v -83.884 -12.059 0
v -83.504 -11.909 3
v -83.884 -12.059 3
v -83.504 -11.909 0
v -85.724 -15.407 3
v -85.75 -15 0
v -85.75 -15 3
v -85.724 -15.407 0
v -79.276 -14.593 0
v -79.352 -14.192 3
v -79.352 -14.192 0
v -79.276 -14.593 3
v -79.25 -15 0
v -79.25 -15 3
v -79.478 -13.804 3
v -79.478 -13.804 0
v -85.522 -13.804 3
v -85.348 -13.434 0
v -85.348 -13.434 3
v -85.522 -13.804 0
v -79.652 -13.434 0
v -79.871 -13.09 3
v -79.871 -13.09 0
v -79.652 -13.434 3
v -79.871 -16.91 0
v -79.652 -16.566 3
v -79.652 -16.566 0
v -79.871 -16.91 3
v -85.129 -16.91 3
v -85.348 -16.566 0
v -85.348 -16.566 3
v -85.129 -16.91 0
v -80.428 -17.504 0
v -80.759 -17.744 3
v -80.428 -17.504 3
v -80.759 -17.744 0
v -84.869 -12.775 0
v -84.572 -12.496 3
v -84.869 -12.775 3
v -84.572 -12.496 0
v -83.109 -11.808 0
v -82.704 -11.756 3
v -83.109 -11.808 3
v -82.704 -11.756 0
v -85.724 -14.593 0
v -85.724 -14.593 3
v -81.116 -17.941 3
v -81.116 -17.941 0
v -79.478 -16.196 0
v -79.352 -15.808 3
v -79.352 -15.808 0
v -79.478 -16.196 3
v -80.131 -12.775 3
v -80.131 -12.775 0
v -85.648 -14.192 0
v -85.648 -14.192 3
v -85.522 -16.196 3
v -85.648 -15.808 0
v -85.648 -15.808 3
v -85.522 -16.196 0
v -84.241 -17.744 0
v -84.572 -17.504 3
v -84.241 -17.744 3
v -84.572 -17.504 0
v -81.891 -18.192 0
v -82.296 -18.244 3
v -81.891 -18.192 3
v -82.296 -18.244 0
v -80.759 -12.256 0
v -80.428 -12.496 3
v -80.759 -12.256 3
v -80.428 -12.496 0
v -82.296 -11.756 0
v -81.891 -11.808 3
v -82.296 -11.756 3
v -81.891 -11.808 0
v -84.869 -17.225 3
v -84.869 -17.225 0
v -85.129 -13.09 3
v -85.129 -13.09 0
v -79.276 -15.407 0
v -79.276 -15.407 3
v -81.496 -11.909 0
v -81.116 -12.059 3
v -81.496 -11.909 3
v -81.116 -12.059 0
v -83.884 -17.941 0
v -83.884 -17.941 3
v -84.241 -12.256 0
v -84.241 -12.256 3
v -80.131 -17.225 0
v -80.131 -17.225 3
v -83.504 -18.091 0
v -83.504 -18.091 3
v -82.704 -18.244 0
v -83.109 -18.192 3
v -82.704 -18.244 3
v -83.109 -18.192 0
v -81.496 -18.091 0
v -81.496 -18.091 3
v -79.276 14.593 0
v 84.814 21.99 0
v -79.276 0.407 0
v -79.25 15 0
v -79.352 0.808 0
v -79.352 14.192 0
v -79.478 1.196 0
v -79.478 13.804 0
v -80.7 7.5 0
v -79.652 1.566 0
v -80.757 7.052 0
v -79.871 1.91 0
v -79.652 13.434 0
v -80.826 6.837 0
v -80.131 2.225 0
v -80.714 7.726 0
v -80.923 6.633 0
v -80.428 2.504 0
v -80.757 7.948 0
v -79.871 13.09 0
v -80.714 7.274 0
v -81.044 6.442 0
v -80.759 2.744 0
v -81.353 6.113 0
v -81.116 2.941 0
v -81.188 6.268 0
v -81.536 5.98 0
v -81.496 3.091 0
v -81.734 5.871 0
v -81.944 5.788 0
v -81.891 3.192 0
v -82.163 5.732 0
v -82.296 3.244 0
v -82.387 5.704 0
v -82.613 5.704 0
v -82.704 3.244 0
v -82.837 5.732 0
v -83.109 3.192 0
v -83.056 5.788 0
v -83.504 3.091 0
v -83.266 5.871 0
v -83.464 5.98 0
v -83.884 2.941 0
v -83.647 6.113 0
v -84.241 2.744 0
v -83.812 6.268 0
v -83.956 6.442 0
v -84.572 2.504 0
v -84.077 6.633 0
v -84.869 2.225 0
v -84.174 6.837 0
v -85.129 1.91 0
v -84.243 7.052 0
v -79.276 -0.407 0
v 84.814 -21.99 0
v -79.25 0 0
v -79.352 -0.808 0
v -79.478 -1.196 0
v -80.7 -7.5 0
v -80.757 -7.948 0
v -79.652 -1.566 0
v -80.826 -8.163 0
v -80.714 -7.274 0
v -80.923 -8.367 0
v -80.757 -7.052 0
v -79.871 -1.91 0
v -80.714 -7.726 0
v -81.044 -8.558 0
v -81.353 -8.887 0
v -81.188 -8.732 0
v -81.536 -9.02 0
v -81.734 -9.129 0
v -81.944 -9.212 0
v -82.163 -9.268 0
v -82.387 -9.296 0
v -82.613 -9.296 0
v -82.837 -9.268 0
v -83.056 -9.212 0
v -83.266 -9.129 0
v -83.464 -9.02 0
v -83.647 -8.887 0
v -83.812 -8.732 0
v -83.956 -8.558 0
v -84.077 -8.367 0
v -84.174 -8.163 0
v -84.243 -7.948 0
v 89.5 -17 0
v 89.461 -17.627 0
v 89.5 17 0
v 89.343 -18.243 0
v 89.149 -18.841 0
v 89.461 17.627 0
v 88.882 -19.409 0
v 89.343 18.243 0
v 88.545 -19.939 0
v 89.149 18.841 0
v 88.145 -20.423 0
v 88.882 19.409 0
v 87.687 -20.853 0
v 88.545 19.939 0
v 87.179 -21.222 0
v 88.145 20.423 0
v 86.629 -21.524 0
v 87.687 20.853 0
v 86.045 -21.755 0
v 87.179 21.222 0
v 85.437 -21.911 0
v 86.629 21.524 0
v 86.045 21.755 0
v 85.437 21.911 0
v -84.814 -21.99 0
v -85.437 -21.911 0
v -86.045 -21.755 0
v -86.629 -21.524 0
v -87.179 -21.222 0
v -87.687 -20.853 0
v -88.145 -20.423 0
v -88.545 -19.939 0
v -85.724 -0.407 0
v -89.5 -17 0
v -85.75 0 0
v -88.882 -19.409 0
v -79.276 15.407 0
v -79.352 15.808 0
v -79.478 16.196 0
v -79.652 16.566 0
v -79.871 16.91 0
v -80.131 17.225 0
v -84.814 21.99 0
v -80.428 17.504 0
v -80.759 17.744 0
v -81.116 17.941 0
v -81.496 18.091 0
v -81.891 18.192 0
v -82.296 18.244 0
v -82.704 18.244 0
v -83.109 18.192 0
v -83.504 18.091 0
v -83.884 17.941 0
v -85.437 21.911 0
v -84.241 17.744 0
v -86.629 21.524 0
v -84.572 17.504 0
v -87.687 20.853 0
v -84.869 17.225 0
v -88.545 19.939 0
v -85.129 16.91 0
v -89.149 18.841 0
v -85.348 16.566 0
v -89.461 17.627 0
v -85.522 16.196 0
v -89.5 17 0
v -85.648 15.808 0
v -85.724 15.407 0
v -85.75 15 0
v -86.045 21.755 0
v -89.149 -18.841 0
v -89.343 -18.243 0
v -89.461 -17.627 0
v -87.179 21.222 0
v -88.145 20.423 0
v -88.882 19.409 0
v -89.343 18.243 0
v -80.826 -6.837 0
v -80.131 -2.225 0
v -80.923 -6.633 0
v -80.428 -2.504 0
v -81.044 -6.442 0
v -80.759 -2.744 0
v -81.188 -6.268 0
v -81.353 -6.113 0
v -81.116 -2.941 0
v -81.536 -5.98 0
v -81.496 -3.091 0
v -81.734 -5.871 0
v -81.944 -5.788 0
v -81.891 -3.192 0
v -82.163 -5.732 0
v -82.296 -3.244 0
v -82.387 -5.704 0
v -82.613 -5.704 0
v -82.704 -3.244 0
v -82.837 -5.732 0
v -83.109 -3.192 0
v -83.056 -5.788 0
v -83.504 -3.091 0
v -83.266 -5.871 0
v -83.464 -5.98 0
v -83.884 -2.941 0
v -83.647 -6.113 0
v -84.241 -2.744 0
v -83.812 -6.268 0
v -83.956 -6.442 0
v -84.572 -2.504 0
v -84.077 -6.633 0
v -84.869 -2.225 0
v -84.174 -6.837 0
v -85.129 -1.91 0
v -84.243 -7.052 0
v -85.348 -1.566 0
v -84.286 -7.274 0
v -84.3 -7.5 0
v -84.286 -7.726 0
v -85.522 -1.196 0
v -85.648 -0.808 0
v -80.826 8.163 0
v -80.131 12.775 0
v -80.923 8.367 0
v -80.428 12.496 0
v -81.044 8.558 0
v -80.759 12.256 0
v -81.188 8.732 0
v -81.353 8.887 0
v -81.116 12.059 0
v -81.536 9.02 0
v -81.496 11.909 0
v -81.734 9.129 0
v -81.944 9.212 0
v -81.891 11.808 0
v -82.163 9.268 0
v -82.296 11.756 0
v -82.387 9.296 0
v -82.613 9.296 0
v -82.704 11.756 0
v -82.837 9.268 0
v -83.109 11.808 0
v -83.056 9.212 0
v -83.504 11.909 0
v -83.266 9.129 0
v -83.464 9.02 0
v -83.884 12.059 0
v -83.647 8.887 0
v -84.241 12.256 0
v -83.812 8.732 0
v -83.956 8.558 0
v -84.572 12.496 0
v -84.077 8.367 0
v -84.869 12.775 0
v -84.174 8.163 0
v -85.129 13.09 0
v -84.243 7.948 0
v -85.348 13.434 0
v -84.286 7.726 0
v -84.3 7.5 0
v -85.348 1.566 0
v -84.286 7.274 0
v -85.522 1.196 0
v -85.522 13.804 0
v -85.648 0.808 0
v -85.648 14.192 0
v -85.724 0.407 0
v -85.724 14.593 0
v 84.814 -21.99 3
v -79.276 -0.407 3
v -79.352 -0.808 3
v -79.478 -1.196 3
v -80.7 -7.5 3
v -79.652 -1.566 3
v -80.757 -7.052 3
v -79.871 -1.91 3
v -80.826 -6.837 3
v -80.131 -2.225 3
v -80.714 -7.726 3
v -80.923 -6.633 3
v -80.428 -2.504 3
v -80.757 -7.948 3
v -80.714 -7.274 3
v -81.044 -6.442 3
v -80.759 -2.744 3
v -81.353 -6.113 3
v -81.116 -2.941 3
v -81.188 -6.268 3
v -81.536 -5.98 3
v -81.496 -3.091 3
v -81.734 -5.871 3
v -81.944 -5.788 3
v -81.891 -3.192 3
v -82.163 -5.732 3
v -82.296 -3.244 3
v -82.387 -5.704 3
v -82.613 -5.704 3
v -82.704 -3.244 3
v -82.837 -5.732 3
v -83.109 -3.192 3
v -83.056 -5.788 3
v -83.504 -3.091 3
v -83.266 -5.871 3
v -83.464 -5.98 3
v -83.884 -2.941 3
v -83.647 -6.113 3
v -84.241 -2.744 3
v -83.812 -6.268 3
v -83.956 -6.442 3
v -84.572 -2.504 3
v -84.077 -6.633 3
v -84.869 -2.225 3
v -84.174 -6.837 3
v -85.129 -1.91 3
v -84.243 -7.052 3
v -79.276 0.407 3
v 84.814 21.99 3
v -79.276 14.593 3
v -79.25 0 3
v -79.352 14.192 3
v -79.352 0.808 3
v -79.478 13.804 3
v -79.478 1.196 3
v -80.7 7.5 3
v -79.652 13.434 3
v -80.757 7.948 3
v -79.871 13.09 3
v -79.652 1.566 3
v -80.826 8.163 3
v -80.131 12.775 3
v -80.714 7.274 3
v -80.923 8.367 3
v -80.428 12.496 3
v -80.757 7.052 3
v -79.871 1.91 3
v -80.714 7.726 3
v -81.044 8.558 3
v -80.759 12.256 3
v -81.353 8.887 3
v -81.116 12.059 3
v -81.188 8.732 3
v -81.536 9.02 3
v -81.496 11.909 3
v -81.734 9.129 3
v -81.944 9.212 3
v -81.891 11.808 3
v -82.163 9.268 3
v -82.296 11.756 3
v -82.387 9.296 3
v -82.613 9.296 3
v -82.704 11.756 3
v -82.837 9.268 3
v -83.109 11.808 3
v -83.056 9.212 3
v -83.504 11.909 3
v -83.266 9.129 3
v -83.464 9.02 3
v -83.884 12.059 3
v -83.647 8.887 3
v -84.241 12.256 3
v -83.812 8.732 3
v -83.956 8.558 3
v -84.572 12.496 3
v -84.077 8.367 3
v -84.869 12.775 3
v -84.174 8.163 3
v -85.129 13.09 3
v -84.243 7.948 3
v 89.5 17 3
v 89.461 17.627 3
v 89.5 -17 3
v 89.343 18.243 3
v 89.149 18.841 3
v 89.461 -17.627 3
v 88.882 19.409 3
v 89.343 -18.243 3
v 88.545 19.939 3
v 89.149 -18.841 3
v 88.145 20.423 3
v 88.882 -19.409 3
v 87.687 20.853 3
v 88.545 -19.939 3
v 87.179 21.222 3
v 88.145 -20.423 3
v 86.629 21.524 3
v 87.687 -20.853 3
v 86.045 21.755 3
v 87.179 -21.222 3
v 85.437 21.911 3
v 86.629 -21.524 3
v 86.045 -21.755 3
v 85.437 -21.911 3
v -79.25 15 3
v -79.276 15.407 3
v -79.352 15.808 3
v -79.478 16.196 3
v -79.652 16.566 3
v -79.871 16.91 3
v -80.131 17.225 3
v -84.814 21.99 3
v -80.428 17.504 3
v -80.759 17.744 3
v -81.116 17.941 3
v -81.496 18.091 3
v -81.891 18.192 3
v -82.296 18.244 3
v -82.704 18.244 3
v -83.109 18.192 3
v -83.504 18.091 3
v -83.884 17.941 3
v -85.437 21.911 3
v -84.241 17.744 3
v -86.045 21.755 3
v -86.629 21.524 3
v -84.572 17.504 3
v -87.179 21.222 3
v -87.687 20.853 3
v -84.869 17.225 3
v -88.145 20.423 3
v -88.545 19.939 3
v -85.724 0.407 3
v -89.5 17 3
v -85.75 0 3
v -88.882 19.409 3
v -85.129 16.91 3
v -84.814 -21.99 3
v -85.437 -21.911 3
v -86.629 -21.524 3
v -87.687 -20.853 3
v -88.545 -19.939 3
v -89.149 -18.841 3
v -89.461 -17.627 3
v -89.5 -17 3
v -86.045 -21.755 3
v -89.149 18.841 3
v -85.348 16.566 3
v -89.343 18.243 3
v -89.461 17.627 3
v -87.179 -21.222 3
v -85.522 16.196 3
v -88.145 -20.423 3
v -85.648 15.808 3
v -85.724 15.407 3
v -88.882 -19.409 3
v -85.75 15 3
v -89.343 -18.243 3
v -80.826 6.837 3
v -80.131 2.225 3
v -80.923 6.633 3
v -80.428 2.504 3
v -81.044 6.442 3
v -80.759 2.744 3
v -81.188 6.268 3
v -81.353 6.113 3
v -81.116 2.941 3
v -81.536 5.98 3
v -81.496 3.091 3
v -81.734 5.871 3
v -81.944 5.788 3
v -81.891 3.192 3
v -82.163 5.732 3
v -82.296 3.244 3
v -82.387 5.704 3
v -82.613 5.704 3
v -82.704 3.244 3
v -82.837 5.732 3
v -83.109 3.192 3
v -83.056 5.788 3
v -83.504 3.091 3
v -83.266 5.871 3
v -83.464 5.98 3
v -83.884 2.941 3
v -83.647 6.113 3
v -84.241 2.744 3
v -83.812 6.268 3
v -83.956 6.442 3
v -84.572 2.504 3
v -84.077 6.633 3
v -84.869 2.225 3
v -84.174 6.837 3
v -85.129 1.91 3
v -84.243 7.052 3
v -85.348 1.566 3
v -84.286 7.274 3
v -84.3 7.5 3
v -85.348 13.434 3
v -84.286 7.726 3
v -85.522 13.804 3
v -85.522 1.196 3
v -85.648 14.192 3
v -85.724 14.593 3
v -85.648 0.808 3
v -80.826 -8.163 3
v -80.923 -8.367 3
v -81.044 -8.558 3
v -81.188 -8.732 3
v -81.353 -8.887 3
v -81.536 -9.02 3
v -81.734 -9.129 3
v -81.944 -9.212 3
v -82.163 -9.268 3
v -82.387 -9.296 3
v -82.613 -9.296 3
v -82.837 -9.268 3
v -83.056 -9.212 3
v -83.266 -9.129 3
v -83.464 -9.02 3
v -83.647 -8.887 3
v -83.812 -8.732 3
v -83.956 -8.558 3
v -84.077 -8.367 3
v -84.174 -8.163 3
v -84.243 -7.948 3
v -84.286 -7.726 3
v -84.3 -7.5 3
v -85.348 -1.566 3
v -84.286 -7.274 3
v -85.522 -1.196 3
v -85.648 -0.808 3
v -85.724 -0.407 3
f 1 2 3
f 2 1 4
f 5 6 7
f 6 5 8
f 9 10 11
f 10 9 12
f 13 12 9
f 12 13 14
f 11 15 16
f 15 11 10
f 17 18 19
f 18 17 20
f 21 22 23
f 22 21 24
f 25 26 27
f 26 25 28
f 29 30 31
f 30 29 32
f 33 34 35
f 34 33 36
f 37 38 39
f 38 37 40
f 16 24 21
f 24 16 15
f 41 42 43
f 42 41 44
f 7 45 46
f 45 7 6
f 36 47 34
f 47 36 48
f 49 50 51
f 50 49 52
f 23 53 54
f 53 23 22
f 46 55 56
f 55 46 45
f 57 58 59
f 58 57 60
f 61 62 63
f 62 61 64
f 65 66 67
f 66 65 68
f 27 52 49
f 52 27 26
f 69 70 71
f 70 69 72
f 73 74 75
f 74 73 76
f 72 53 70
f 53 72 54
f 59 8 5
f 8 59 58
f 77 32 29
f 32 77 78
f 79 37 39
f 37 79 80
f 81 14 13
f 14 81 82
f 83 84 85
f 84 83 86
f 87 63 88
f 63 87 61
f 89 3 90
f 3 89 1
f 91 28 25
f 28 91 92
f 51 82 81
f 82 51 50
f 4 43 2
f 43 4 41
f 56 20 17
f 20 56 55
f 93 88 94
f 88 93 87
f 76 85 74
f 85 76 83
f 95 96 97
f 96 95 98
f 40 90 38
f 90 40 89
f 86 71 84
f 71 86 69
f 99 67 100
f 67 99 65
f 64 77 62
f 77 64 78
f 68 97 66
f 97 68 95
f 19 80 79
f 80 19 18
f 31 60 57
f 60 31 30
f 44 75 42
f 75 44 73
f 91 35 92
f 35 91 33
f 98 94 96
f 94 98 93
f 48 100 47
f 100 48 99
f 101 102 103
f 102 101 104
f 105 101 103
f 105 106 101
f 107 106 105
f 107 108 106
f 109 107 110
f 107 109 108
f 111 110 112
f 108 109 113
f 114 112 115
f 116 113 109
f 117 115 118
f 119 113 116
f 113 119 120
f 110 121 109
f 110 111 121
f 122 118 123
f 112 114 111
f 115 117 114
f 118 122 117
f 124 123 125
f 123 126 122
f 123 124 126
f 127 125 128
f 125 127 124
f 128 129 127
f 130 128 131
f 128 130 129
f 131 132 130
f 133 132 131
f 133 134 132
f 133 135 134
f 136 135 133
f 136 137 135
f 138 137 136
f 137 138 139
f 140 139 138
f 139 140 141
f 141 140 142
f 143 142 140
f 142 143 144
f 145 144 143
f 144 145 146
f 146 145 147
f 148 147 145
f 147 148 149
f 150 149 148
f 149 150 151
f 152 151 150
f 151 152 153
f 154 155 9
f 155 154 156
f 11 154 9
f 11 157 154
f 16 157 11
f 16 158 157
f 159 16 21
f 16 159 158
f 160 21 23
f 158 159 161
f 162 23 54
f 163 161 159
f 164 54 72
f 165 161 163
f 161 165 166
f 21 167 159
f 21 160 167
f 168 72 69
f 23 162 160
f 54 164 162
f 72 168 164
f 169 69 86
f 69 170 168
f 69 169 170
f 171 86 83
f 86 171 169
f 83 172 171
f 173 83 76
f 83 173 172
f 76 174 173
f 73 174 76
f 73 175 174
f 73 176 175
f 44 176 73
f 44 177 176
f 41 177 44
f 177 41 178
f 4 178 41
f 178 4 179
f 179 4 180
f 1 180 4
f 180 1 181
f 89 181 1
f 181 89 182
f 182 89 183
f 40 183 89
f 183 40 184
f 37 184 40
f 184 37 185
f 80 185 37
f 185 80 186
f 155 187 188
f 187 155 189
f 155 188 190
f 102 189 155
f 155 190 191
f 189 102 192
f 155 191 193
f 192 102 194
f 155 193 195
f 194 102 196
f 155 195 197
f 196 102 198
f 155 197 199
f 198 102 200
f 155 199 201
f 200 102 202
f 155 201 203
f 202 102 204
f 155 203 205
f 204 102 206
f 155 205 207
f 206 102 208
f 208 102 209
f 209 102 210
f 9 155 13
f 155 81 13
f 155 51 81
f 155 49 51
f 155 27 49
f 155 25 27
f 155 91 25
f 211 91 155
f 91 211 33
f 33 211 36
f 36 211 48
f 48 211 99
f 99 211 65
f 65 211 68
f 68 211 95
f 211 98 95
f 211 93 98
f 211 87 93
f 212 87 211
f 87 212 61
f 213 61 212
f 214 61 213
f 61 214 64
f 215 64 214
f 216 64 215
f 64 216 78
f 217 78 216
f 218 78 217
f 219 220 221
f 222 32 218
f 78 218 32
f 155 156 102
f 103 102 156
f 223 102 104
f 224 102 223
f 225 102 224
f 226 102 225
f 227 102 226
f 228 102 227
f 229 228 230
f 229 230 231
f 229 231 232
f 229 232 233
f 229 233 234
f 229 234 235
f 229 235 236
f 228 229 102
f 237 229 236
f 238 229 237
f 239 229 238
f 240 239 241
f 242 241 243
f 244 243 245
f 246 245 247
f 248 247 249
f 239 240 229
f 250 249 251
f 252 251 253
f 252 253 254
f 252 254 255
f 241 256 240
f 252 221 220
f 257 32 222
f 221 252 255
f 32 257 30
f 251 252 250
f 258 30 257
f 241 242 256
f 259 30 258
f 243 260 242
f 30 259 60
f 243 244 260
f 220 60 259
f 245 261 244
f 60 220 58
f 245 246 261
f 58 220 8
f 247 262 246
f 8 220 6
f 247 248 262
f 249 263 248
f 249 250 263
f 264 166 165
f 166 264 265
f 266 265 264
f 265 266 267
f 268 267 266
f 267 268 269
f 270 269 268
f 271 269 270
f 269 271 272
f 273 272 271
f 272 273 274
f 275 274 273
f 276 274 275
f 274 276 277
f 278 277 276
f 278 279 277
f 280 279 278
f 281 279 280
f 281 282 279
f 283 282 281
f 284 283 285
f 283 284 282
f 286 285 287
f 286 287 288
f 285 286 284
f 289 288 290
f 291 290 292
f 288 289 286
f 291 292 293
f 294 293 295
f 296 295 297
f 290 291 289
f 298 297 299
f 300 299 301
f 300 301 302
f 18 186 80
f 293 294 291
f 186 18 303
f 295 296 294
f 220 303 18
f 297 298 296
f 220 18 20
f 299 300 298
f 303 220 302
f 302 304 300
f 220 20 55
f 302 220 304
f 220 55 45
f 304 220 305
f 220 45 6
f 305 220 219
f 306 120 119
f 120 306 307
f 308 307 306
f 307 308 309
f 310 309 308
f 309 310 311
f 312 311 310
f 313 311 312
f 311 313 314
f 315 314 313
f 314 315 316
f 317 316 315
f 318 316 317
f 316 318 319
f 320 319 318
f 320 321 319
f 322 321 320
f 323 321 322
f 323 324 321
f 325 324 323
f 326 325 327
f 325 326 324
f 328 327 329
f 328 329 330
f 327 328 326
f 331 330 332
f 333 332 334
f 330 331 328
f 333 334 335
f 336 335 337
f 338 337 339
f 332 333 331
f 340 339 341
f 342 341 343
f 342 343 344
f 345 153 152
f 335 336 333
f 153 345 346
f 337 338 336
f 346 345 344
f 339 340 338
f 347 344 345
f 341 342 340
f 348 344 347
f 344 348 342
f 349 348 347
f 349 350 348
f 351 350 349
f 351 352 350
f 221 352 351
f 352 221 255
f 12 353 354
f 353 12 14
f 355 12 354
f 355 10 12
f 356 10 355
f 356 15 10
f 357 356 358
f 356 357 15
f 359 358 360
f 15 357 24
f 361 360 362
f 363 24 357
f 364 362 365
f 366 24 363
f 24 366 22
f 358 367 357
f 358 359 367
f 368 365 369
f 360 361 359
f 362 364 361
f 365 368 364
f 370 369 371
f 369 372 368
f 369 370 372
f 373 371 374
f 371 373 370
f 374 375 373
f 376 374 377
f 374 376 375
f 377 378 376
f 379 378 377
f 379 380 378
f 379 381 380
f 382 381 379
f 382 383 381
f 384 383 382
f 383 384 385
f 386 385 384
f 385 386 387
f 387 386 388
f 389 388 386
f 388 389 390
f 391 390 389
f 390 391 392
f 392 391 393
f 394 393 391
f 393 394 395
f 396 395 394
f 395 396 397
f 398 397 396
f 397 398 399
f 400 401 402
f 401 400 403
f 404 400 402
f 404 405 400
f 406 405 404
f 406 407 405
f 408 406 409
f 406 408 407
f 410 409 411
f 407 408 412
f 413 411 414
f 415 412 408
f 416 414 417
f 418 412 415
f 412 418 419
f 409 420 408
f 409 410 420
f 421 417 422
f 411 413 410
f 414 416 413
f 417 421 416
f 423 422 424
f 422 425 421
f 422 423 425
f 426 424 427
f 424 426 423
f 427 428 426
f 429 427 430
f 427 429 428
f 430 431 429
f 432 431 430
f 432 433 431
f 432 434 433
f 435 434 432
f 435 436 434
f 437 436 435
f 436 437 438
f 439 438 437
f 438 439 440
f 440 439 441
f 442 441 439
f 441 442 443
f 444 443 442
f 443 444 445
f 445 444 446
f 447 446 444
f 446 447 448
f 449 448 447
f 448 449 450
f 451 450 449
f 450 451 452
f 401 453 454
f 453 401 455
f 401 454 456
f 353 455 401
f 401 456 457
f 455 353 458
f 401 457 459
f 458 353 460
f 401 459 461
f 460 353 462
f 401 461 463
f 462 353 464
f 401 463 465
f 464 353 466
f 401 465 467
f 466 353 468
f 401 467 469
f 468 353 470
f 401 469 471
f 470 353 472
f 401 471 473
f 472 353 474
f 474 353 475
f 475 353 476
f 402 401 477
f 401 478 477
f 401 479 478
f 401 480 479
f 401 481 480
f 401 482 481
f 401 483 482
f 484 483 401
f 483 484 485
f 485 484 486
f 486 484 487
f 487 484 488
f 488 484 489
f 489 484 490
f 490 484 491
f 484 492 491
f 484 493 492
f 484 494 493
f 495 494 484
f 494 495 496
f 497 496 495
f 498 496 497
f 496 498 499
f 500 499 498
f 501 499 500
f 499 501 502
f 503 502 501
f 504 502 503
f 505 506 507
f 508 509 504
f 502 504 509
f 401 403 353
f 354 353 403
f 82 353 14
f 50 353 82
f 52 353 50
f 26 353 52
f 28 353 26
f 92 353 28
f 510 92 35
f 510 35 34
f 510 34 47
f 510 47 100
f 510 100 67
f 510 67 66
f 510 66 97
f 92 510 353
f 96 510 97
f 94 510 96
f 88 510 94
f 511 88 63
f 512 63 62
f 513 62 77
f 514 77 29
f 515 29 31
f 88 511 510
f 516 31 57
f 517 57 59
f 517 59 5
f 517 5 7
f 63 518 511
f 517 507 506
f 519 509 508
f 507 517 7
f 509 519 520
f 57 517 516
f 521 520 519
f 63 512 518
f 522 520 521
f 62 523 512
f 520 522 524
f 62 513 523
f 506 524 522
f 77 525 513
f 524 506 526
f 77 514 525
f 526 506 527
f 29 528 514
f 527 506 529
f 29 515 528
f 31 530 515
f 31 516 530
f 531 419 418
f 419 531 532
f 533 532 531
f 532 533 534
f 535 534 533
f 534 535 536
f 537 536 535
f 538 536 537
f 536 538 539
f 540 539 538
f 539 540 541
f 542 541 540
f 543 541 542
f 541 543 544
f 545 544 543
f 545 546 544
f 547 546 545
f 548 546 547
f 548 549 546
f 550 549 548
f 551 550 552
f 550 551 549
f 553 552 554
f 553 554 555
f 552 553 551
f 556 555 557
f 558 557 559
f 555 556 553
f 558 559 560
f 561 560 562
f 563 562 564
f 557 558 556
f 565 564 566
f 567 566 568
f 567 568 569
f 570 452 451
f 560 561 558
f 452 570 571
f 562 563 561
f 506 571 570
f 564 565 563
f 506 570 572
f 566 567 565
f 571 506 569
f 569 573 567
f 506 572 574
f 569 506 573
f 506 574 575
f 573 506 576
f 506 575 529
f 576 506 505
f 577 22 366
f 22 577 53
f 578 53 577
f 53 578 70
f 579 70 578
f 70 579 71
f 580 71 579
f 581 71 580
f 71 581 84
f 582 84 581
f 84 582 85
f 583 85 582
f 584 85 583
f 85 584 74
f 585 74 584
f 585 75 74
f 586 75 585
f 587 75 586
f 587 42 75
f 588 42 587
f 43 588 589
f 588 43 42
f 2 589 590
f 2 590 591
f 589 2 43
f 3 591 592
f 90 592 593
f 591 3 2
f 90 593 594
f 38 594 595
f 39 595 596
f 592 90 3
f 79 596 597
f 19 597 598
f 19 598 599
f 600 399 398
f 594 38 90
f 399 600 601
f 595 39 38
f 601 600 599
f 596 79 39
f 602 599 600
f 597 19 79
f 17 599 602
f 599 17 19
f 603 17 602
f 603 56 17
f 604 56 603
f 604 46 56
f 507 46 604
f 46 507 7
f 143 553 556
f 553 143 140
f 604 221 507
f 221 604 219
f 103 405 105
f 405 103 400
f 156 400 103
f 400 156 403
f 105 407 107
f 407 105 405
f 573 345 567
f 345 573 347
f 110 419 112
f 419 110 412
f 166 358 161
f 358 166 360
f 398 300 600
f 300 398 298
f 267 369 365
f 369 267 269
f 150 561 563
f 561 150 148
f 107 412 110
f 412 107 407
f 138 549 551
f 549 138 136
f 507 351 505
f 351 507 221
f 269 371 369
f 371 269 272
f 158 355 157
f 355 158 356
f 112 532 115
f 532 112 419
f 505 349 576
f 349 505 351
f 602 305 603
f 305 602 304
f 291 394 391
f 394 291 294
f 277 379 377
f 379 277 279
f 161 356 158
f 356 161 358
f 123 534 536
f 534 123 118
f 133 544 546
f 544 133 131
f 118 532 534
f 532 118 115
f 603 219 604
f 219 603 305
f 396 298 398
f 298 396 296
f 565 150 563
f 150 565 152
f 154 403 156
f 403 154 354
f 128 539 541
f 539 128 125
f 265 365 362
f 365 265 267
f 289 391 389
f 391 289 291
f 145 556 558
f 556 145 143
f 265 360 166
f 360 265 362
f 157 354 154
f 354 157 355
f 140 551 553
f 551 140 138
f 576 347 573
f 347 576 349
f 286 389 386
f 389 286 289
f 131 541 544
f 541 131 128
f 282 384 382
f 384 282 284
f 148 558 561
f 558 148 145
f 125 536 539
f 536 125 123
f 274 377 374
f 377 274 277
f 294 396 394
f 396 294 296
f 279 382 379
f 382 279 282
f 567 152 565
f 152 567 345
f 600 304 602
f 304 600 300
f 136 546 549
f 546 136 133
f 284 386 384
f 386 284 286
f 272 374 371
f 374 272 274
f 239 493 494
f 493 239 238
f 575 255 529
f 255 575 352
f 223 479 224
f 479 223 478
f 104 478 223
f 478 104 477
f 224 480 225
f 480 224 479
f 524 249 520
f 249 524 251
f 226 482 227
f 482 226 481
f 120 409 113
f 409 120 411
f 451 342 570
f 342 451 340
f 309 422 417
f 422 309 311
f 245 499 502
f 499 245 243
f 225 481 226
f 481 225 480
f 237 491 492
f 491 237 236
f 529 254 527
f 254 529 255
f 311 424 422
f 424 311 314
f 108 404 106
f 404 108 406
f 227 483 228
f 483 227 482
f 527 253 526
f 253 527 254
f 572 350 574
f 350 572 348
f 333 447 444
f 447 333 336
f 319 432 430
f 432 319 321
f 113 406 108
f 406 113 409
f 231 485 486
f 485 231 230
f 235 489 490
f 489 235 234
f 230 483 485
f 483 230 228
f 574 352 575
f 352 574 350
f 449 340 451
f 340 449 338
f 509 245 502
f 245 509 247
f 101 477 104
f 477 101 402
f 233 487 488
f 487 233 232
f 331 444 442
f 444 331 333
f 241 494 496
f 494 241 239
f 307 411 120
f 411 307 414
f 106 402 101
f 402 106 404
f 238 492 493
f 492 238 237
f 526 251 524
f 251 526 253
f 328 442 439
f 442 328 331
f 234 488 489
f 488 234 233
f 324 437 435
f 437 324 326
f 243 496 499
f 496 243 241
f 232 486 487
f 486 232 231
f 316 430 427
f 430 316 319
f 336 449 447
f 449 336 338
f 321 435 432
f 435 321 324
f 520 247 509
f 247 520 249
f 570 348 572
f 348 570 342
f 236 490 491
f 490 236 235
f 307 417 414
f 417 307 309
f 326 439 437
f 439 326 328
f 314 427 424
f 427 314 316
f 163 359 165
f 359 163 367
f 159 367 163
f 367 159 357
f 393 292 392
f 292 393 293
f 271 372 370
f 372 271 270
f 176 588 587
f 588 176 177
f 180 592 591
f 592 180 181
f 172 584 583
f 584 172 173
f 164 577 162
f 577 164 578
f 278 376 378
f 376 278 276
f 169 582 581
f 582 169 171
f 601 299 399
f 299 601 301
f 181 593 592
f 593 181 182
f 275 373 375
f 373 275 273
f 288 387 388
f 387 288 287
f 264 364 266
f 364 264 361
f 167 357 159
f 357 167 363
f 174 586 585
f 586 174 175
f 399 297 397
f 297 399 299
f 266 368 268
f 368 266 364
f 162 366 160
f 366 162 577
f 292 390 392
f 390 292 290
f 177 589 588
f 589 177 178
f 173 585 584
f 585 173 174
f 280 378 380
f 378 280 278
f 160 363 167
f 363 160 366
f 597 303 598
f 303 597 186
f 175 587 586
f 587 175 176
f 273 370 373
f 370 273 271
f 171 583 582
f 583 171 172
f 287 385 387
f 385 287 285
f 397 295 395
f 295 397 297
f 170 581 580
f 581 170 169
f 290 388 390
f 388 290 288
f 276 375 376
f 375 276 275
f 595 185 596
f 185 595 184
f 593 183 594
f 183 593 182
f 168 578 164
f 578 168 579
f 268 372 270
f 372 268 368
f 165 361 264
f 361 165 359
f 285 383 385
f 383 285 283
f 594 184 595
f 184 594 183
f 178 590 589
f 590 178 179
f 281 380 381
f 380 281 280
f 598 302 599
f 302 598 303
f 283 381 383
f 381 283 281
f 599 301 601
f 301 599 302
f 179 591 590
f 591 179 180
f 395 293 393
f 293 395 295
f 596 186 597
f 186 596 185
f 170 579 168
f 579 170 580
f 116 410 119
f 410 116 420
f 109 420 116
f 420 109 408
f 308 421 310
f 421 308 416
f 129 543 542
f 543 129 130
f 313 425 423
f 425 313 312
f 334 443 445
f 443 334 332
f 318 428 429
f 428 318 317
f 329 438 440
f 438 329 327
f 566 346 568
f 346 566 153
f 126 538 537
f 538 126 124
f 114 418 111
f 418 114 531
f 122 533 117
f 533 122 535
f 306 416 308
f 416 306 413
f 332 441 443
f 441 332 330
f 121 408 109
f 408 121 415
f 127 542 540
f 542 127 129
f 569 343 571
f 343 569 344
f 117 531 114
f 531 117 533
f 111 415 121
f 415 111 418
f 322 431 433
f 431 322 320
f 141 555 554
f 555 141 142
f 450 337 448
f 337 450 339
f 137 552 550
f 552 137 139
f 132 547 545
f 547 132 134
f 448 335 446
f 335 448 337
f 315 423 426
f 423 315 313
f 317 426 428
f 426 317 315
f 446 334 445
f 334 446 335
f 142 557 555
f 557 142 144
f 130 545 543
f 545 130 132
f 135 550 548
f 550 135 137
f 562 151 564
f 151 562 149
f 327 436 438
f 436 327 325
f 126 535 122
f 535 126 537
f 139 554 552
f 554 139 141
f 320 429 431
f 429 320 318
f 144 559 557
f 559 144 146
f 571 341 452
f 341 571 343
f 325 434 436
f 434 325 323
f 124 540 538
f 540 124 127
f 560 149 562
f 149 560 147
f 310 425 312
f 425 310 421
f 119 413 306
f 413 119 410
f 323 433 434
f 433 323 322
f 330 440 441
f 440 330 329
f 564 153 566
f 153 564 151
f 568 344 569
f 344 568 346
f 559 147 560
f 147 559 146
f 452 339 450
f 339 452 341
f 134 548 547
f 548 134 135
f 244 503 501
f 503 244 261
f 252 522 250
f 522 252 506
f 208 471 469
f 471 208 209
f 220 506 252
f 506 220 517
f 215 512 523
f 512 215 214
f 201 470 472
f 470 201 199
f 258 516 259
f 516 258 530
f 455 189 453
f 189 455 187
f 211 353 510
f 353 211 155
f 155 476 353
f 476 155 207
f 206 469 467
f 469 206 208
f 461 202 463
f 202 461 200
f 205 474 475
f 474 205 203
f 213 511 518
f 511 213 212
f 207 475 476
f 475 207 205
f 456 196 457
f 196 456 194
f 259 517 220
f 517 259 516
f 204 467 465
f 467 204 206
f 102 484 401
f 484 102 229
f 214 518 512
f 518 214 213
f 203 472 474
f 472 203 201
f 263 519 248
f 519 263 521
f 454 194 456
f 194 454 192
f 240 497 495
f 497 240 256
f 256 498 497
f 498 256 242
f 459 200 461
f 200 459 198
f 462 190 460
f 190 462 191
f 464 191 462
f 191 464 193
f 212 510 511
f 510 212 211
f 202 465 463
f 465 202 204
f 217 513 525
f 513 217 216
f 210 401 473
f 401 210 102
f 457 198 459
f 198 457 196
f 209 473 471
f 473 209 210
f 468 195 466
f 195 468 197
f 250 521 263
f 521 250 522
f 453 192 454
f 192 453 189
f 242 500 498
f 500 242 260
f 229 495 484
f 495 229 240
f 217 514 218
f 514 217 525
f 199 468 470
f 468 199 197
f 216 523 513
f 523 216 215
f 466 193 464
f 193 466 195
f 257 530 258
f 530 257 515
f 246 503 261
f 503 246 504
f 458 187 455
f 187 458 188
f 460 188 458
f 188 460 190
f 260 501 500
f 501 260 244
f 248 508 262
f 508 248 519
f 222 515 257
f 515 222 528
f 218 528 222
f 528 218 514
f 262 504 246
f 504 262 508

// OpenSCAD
$fn = 50;


difference() {
	union() {
		hull() {
			translate(v = [-84.5000000000, 17.0000000000, 0]) {
				cylinder(h = 3, r = 5);
			}
			translate(v = [84.5000000000, 17.0000000000, 0]) {
				cylinder(h = 3, r = 5);
			}
			translate(v = [-84.5000000000, -17.0000000000, 0]) {
				cylinder(h = 3, r = 5);
			}
			translate(v = [84.5000000000, -17.0000000000, 0]) {
				cylinder(h = 3, r = 5);
			}
		}
	}
	union() {
		translate(v = [-82.5000000000, -15.0000000000, 0]) {
			cylinder(h = 3, r = 3.2500000000);
		}
		translate(v = [-82.5000000000, 0.0000000000, 0]) {
			cylinder(h = 3, r = 3.2500000000);
		}
		translate(v = [-82.5000000000, 15.0000000000, 0]) {
			cylinder(h = 3, r = 3.2500000000);
		}
		translate(v = [-82.5000000000, -15.0000000000, 0]) {
			cylinder(h = 3, r = 1.8000000000);
		}
		translate(v = [-82.5000000000, -7.5000000000, 0]) {
			cylinder(h = 3, r = 1.8000000000);
		}
		translate(v = [-82.5000000000, 0.0000000000, 0]) {
			cylinder(h = 3, r = 1.8000000000);
		}
		translate(v = [-82.5000000000, 7.5000000000, 0]) {
			cylinder(h = 3, r = 1.8000000000);
		}
		translate(v = [-82.5000000000, 15.0000000000, 0]) {
			cylinder(h = 3, r = 1.8000000000);
		}
		translate(v = [-82.5000000000, -15.0000000000, 0]) {
			cylinder(h = 3, r = 1.8000000000);
		}
		translate(v = [-82.5000000000, -7.5000000000, 0]) {
			cylinder(h = 3, r = 1.8000000000);
		}
		translate(v = [-82.5000000000, 0.0000000000, 0]) {
			cylinder(h = 3, r = 1.8000000000);
		}
		translate(v = [-82.5000000000, 7.5000000000, 0]) {
			cylinder(h = 3, r = 1.8000000000);
		}
		translate(v = [-82.5000000000, 15.0000000000, 0]) {
			cylinder(h = 3, r = 1.8000000000);
		}
		translate(v = [-82.5000000000, -15.0000000000, 0]) {
			cylinder(h = 3, r = 1.8000000000);
		}
		translate(v = [-82.5000000000, -7.5000000000, 0]) {
			cylinder(h = 3, r = 1.8000000000);
		}
		translate(v = [-82.5000000000, 0.0000000000, 0]) {
			cylinder(h = 3, r = 1.8000000000);
		}
		translate(v = [-82.5000000000, 7.5000000000, 0]) {
			cylinder(h = 3, r = 1.8000000000);
		}
		translate(v = [-82.5000000000, 15.0000000000, 0]) {
			cylinder(h = 3, r = 1.8000000000);
		}
	}
}
